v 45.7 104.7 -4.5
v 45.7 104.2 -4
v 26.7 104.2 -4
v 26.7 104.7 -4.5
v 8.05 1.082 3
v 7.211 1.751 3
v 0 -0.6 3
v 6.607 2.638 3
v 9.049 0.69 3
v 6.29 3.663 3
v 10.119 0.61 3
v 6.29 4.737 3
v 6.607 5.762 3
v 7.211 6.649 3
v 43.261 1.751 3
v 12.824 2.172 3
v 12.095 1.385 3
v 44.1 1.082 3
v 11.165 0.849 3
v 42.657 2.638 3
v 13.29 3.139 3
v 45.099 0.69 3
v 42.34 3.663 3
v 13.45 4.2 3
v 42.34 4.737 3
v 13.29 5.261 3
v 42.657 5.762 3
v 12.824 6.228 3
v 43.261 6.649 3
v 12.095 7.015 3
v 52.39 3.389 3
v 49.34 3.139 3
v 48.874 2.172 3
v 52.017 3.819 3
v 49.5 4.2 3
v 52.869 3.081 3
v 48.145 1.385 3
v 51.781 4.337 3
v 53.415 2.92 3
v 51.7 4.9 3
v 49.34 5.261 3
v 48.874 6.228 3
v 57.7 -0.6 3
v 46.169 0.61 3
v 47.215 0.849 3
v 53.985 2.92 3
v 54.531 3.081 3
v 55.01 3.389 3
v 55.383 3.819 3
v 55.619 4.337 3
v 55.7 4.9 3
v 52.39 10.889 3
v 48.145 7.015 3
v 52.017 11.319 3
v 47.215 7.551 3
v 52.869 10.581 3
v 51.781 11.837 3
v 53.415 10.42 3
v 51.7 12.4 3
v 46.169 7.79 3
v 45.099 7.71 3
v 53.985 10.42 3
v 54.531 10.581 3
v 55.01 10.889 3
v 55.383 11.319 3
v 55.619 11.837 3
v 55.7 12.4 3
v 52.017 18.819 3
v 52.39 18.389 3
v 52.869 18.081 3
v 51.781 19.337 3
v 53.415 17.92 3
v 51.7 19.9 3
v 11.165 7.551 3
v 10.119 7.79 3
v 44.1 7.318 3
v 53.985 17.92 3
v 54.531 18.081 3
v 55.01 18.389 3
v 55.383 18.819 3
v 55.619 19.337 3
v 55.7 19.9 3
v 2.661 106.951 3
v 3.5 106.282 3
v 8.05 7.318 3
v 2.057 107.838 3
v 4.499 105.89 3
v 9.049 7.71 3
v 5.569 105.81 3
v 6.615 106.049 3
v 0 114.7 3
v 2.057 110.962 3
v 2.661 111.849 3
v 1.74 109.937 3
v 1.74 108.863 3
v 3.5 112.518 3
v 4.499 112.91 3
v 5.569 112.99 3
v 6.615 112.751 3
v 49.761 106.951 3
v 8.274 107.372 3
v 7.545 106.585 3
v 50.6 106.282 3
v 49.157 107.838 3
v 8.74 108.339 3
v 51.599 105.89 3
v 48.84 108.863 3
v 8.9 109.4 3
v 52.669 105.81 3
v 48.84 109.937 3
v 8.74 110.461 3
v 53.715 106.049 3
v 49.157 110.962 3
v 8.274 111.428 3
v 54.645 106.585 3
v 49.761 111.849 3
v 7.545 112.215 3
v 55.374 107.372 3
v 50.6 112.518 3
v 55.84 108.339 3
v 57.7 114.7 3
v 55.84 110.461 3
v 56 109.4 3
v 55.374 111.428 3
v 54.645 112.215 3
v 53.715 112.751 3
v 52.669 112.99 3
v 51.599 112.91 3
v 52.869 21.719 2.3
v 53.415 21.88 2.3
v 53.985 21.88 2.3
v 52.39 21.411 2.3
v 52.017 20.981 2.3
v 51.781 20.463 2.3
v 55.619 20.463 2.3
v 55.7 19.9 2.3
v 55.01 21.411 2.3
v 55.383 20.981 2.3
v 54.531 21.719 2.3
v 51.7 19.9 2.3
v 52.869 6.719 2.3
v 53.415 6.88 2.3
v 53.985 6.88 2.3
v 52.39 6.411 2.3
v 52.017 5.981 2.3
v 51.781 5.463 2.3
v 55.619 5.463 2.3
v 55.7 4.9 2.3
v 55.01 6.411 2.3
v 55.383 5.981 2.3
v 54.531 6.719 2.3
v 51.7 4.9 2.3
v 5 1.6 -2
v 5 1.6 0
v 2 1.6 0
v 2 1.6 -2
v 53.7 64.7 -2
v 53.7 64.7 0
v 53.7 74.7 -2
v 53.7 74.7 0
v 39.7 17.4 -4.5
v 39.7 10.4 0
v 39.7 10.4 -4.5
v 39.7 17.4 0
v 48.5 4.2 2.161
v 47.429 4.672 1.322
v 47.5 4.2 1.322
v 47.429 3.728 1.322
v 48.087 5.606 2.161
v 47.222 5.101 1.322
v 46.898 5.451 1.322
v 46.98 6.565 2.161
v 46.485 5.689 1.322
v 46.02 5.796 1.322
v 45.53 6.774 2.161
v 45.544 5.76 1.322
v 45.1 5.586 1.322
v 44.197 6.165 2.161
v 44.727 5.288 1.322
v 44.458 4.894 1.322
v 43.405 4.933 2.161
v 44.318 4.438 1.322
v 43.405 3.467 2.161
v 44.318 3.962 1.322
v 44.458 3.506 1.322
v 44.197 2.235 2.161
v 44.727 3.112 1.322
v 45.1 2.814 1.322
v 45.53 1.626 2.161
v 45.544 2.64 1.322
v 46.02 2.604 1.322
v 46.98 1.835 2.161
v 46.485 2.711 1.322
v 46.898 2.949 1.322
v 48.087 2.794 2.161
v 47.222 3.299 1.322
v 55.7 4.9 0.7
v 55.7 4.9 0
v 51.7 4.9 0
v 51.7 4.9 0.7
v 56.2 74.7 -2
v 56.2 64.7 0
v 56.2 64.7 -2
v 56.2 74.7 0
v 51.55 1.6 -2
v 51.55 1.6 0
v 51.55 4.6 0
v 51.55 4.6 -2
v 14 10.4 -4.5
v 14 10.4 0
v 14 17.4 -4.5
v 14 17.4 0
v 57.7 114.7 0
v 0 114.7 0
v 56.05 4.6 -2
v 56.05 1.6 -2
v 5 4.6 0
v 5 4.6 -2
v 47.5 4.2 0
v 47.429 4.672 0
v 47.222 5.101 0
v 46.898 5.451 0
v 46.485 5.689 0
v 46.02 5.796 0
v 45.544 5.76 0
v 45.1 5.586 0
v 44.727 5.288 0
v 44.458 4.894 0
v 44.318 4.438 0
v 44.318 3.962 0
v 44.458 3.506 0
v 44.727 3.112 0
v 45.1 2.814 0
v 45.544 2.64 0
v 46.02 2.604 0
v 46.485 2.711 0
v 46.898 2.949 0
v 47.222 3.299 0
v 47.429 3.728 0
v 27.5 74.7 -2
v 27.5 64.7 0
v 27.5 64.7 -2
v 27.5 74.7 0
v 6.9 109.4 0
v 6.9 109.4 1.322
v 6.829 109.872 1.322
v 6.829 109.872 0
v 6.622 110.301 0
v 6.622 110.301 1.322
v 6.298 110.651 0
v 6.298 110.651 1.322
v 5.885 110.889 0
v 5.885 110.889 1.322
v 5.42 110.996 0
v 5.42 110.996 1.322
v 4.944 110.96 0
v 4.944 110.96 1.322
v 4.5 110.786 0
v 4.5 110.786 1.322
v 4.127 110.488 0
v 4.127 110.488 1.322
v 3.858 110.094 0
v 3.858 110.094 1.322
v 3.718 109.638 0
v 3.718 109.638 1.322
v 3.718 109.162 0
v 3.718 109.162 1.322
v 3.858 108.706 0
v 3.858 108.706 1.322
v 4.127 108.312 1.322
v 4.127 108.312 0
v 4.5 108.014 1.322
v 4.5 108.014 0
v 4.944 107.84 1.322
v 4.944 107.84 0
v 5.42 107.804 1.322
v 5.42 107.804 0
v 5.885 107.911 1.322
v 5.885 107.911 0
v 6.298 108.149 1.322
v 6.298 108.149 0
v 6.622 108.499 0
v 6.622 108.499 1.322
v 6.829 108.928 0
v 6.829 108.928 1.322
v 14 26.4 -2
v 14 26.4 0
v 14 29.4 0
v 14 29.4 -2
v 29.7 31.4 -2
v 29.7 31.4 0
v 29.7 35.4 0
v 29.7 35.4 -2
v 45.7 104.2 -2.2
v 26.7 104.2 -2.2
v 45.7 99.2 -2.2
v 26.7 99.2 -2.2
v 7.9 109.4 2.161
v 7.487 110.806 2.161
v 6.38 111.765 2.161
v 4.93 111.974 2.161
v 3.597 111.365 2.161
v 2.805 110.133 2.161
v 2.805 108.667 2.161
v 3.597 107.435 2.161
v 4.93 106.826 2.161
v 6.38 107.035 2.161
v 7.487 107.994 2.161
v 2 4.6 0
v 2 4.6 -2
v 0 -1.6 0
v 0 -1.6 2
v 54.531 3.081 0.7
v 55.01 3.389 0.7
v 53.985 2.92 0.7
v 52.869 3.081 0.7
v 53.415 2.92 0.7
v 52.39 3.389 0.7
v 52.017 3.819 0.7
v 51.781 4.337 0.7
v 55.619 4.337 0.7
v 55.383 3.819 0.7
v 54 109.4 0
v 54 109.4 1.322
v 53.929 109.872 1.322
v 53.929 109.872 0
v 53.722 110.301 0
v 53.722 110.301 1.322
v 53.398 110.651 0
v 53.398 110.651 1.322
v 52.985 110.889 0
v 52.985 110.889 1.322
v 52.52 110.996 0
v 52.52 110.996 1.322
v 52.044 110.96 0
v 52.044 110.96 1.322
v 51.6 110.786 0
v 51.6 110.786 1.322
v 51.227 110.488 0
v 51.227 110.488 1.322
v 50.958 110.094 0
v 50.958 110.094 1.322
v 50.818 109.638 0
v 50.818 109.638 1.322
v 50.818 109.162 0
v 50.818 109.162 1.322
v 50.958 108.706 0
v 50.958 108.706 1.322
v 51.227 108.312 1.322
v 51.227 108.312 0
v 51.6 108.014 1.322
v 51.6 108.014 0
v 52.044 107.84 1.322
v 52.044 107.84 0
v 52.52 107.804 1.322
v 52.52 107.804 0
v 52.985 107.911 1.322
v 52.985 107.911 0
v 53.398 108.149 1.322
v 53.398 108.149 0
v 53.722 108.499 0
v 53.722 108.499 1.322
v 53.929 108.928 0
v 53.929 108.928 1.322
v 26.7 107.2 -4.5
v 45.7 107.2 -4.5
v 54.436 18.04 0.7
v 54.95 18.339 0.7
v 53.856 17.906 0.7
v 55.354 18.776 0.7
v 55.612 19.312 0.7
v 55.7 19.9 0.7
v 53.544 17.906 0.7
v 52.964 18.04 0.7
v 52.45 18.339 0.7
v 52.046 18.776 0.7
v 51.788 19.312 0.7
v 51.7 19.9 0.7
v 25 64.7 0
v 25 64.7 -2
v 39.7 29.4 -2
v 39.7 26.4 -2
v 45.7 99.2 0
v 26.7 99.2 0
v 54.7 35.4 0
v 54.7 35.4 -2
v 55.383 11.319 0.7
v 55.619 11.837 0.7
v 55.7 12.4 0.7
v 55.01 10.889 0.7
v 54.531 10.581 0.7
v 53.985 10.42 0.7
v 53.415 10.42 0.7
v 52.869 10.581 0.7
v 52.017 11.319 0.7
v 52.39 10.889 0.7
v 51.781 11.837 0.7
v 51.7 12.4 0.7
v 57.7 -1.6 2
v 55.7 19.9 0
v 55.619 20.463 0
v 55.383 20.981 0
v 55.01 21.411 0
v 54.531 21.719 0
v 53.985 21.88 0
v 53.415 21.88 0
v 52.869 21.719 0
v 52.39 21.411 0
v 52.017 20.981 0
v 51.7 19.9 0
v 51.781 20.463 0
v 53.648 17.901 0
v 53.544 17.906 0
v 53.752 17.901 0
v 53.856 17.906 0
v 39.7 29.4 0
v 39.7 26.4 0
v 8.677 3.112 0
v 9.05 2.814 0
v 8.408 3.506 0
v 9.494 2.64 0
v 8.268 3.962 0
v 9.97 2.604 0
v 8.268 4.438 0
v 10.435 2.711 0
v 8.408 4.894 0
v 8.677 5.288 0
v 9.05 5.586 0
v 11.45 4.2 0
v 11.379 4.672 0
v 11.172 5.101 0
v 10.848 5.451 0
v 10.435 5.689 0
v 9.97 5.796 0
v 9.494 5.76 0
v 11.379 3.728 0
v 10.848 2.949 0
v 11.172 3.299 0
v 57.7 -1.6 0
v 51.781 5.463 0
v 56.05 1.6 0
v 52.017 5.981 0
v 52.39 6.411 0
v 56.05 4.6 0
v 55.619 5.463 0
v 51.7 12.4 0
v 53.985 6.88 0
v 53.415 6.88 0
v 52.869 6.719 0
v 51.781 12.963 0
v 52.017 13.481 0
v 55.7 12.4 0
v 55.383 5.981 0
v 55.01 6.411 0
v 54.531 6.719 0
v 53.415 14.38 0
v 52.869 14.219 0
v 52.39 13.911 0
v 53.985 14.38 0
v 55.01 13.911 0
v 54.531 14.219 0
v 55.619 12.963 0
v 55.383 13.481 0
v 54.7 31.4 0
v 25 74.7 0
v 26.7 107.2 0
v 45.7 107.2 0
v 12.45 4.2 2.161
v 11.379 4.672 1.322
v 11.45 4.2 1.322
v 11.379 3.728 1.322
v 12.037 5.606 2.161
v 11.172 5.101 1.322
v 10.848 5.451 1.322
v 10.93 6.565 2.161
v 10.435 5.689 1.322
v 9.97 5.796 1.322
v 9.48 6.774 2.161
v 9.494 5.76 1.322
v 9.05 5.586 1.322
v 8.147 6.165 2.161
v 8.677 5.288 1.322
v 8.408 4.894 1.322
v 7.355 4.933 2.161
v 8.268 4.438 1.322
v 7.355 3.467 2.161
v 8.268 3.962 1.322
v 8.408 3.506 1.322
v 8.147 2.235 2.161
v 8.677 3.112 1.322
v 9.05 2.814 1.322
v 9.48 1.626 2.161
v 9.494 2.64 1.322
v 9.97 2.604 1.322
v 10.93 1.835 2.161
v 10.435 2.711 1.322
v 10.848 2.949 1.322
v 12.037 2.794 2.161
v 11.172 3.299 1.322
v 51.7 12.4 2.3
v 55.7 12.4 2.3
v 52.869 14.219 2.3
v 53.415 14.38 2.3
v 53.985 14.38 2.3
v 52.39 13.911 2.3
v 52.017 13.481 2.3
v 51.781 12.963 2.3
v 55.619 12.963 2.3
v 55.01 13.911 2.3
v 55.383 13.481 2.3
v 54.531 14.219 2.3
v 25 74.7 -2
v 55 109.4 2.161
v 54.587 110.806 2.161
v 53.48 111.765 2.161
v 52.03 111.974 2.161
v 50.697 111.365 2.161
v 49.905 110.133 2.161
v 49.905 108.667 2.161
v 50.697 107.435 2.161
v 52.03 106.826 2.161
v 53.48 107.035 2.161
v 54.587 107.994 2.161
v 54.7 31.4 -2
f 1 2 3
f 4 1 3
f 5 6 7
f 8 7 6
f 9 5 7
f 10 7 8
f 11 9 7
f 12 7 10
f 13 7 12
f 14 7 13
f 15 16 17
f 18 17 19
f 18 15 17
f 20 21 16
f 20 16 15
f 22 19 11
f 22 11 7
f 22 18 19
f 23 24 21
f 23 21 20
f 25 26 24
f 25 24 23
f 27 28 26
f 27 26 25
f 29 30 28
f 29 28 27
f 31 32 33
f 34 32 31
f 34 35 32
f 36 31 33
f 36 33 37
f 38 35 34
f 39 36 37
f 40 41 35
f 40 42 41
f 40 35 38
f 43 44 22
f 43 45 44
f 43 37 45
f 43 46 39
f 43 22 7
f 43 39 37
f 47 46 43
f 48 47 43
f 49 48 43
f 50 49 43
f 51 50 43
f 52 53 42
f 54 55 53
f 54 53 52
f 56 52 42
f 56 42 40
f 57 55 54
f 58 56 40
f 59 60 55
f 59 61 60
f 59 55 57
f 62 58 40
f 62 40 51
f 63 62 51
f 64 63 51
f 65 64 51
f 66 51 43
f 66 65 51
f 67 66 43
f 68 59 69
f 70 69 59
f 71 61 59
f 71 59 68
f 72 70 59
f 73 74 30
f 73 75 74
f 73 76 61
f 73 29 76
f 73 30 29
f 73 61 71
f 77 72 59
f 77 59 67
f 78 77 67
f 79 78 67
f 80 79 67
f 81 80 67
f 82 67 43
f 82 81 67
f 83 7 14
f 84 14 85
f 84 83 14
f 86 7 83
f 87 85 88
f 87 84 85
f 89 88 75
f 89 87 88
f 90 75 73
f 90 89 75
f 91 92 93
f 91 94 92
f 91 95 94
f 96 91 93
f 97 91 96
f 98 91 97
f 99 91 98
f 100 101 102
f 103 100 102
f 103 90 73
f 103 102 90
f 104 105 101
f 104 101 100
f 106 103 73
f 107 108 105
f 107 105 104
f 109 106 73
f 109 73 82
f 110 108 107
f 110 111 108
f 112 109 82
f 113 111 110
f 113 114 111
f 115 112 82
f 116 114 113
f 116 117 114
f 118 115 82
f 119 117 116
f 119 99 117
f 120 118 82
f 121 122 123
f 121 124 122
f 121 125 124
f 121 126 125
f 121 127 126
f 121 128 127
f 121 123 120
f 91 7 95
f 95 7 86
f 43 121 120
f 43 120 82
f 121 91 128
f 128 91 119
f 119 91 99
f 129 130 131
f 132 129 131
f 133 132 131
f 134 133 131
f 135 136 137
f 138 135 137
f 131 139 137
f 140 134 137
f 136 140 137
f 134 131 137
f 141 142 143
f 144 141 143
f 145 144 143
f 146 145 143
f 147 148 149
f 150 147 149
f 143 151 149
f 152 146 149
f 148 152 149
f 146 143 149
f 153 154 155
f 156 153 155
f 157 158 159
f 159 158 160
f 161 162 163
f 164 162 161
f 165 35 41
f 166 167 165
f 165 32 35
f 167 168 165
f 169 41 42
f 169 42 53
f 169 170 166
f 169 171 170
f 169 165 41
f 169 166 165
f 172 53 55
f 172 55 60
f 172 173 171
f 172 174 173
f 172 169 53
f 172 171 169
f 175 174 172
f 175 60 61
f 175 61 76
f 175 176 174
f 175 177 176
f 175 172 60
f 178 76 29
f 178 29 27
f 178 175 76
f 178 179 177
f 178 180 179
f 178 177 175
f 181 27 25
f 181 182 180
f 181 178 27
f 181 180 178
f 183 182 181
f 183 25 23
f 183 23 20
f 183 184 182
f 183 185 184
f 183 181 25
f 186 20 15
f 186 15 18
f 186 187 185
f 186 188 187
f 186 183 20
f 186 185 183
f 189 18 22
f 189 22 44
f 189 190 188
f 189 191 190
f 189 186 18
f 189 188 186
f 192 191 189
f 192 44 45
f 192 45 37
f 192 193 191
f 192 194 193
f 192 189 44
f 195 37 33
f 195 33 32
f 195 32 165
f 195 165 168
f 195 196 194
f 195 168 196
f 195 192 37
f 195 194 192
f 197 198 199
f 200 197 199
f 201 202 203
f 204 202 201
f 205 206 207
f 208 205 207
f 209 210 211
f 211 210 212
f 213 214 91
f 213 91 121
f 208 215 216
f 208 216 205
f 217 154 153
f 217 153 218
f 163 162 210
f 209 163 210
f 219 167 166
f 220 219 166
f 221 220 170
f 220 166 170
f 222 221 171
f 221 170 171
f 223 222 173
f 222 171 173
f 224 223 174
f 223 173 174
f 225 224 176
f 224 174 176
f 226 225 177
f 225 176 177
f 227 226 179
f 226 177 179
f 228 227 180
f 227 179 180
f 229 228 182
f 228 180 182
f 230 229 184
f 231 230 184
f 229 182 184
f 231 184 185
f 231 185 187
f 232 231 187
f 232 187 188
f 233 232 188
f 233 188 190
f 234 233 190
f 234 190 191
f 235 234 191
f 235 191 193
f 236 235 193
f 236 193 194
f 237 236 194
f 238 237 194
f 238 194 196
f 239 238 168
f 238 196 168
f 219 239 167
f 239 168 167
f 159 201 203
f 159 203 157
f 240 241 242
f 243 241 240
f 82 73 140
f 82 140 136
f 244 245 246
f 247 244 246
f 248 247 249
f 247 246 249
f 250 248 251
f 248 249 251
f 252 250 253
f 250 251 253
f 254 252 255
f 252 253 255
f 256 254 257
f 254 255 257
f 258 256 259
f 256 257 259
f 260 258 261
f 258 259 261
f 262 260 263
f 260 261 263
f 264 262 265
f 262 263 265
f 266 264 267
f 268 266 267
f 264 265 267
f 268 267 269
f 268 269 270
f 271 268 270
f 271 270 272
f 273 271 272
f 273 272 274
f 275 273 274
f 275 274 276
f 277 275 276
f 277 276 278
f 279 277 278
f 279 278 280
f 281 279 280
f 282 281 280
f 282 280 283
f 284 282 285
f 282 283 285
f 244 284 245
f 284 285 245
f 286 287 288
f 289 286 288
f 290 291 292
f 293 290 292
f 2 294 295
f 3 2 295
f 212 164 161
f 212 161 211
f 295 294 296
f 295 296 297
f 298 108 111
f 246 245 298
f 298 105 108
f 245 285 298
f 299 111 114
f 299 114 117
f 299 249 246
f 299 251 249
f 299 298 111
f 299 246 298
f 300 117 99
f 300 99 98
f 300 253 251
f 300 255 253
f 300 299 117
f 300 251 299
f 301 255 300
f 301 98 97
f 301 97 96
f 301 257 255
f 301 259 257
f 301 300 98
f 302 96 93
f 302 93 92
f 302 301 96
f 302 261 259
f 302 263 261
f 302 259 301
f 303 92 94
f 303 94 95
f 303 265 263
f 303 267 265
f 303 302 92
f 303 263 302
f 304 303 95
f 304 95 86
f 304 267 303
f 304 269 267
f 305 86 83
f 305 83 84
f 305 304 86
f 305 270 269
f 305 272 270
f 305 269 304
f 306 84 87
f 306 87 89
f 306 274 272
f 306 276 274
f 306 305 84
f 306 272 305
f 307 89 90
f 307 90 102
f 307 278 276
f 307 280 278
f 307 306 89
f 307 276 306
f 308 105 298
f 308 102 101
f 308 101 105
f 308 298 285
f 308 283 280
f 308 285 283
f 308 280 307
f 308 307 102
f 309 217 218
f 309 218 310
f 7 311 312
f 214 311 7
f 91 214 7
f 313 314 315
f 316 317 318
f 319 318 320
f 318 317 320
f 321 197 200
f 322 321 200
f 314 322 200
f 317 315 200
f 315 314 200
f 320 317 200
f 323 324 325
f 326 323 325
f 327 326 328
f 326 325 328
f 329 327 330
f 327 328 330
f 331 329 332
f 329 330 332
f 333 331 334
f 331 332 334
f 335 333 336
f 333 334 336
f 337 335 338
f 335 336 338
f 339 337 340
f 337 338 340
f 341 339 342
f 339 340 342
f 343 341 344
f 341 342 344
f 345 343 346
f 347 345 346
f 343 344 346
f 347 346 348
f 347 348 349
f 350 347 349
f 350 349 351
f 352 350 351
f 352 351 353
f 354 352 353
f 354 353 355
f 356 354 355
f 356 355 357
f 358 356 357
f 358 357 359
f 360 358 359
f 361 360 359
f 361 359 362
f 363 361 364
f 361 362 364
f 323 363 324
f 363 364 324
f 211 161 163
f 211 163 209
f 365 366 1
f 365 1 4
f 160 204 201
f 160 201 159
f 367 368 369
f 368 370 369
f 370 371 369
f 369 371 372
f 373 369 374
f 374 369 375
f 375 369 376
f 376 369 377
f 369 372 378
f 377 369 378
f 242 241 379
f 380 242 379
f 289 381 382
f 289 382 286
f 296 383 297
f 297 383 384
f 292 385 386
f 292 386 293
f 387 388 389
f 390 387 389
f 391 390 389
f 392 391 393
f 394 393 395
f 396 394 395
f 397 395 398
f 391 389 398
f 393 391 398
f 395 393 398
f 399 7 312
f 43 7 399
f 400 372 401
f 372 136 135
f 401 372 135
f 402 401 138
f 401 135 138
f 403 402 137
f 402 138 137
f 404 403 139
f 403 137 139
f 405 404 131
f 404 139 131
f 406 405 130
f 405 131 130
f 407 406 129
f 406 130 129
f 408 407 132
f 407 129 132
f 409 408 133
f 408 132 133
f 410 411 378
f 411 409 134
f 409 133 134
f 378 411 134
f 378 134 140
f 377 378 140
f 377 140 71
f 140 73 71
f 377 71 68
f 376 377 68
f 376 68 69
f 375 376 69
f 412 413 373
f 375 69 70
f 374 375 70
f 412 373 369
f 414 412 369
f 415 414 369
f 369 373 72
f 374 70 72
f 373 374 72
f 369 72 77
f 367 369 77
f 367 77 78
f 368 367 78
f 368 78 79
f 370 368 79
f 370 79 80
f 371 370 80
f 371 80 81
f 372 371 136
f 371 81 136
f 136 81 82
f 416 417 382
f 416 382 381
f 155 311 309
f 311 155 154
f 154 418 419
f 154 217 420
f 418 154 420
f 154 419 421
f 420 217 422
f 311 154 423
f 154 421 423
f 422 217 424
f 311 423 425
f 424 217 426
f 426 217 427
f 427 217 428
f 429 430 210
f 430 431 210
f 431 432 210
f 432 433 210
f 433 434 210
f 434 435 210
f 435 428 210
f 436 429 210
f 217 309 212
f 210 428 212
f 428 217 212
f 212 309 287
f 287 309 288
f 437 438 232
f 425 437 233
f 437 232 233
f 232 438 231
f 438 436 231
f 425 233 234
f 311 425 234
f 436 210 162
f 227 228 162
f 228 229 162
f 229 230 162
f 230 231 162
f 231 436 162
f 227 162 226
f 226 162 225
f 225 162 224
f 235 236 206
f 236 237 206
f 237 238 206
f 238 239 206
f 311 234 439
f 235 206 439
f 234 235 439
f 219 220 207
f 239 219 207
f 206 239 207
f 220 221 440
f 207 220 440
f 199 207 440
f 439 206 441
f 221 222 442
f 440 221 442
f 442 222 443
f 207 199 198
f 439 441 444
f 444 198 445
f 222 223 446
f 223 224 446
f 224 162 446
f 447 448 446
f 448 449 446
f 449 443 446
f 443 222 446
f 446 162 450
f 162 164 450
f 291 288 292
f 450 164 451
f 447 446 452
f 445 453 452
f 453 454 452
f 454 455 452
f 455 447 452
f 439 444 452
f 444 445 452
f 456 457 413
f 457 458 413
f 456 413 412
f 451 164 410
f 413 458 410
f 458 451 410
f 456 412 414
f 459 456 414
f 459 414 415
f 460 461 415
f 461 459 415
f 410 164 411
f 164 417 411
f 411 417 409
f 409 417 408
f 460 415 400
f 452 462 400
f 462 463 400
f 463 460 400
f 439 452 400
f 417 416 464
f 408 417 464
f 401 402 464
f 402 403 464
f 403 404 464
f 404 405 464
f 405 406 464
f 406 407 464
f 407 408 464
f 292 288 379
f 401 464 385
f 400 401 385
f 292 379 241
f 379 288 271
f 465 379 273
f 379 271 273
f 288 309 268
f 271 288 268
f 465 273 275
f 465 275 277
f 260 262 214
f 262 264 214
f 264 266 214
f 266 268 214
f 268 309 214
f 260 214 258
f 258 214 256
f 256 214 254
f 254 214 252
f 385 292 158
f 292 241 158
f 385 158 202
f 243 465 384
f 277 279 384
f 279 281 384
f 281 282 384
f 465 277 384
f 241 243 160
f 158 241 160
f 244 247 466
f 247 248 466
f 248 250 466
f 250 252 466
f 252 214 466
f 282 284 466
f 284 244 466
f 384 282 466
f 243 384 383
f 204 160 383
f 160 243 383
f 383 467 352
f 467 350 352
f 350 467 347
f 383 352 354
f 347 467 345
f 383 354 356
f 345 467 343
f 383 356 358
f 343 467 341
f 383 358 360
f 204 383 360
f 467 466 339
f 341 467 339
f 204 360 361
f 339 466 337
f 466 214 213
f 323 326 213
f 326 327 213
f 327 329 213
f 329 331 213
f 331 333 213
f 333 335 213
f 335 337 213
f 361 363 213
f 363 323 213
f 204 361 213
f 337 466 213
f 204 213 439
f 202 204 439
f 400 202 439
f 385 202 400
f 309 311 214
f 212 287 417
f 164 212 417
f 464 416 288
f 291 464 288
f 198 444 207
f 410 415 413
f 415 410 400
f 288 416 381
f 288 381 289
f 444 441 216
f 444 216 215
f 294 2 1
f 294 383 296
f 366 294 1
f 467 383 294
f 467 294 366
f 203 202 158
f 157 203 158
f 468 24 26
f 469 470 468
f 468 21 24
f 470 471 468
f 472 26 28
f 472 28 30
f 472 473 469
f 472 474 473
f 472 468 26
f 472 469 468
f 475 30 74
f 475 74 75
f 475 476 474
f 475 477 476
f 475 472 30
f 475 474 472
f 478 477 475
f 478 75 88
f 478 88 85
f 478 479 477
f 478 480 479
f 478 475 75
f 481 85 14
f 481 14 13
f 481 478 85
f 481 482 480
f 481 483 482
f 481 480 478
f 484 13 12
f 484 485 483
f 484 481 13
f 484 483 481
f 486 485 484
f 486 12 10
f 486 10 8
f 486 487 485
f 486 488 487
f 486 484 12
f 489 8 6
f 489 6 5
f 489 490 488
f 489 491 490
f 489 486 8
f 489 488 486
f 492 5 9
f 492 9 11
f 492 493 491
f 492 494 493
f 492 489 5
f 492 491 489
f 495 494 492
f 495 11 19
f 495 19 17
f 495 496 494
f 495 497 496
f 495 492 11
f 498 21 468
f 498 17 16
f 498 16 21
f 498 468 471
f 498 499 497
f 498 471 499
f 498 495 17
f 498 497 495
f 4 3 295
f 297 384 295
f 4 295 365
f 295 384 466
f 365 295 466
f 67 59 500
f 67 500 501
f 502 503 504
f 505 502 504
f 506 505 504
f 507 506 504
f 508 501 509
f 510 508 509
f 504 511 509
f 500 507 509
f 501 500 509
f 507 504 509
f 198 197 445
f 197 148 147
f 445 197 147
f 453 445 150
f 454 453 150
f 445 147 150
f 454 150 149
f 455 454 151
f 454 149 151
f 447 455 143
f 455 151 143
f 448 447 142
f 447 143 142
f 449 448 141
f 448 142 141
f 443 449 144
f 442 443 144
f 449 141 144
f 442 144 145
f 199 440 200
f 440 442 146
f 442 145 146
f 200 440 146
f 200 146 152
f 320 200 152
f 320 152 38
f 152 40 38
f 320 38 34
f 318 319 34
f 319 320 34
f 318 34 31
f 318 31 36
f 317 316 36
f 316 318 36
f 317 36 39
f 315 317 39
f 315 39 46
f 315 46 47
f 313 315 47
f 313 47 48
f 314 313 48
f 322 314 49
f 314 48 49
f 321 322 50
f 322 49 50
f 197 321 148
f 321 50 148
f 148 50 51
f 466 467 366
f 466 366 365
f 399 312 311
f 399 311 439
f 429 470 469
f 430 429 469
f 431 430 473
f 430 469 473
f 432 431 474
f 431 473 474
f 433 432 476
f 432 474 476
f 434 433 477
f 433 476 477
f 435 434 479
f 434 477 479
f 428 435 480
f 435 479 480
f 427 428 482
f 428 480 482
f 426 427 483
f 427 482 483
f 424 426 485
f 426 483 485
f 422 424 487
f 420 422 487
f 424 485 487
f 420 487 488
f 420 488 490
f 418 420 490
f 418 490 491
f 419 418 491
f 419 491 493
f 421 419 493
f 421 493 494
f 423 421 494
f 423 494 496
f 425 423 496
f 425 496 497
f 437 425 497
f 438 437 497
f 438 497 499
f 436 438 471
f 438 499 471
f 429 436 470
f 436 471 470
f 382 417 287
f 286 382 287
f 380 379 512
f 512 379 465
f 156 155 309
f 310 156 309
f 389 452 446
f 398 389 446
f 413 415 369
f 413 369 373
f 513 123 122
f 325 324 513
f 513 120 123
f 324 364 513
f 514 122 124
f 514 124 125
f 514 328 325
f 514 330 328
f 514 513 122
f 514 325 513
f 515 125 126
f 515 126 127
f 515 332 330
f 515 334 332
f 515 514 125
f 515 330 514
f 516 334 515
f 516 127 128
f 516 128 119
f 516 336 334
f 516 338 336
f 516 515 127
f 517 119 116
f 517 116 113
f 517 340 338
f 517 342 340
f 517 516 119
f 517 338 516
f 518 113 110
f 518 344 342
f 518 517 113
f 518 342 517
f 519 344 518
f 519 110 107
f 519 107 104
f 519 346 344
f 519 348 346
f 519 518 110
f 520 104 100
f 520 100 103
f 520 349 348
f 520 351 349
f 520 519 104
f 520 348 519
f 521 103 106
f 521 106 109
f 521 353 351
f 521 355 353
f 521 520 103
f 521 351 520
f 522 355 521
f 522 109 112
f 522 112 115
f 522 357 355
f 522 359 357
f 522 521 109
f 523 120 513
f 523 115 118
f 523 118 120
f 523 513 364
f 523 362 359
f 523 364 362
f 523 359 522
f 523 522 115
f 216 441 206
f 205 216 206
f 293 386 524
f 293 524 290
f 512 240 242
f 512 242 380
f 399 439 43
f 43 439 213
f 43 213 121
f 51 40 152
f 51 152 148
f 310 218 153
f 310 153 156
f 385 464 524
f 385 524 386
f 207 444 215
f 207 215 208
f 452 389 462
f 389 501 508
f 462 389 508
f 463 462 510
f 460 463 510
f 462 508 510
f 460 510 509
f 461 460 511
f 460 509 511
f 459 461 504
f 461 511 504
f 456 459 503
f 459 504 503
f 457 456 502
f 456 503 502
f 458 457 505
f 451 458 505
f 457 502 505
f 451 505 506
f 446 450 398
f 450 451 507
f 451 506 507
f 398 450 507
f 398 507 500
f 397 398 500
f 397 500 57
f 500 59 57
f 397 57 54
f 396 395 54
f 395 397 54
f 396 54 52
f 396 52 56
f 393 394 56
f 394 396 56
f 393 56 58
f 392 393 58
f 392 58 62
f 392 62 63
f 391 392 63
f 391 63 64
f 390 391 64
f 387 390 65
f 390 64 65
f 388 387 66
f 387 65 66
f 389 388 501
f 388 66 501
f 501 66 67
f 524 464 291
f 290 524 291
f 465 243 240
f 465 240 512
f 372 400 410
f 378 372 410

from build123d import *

# Parameters (mm, degrees)
SKETCH1_W            = 57.7
SKETCH1_H            = 114.7
BOSS_EXTRUDE1_DEPTH  = 3
SKETCH2_R            = 1.6
CUT_EXTRUDE1_DEPTH   = 3
CHAMFER1_SIZE        = 2
CHAMFER1_SIZE2       = 1.678199262
SKETCH4_W            = 57.7
SKETCH4_H            = 3
BOSS_EXTRUDE2_DEPTH  = 1.6
SKETCH5_W            = 19
SKETCH5_H            = 6
BOSS_EXTRUDE3_DEPTH  = 2.2
SKETCH7_W            = 19
SKETCH7_H            = 3
BOSS_EXTRUDE4_DEPTH  = 4.5
CHAMFER2_SIZE        = 0.5
SKETCH8_W            = 25.7
SKETCH8_H            = 3
SKETCH8_W_2          = 25
SKETCH8_H_2          = 4
BOSS_EXTRUDE5_DEPTH  = 2
SKETCH9_W            = 25.7
SKETCH9_H            = 7
BOSS_EXTRUDE6_DEPTH  = 4.5
SKETCH10_R           = 2
CUT_EXTRUDE2_DEPTH   = 3
SKETCH11_W           = 4
SKETCH11_H           = 2
BOSS_EXTRUDE7_DEPTH  = 0.7
SKETCH12_W           = 4
SKETCH12_H           = 1.993871031
SKETCH12_H_2         = 2
BOSS_EXTRUDE11_DEPTH = 0.7
SKETCH13_W           = 4.5
SKETCH13_H           = 3
SKETCH13_W_2         = 3
BOSS_EXTRUDE12_DEPTH = 2
SKETCH14_W           = 2.5
SKETCH14_H           = 10
BOSS_EXTRUDE13_DEPTH = 2
CHAMFER3_SIZE        = 1


with BuildPart() as part:
    # Sketch1 → Boss-Extrude1 (new body)
    with BuildSketch(Plane.XY):
        with Locations((28.85, 57.35)):
            Rectangle(SKETCH1_W, SKETCH1_H)
    extrude(amount=BOSS_EXTRUDE1_DEPTH)

    # Sketch2 → Cut-Extrude1 (cut)
    with BuildSketch(Plane.XY.offset(3)):
        with Locations((5.3, 109.4)):
            Circle(SKETCH2_R)
        with Locations((52.4, 109.4)):
            Circle(SKETCH2_R)
        with Locations((9.85, 4.2)):
            Circle(SKETCH2_R)
        with Locations((45.9, 4.2)):
            Circle(SKETCH2_R)
    extrude(amount=-CUT_EXTRUDE1_DEPTH, mode=Mode.SUBTRACT)

    # Chamfer1
    chamfer1_edges = [part.edges().sort_by_distance(p)[0] for p in [
        (3.7, 109.4, 3),
        (44.3, 4.2, 3),
        (8.25, 4.2, 3),
        (50.8, 109.4, 3),
    ]]
    chamfer1_side = [part.faces().sort_by_distance(p)[0] for p in [
        (28.85238123, 57.352686516, 3),
    ]]
    chamfer(chamfer1_edges, length=CHAMFER1_SIZE, length2=CHAMFER1_SIZE2, reference=chamfer1_side[0])

    # Sketch4 → Boss-Extrude2 (add)
    with BuildSketch(Plane.XZ):
        with Locations((28.85, 1.5)):
            Rectangle(SKETCH4_W, SKETCH4_H)
    extrude(amount=BOSS_EXTRUDE2_DEPTH)

    # Sketch5 → Boss-Extrude3 (add)
    with BuildSketch(Plane(origin=(0, 0, 0), x_dir=(-1, 0, 0), z_dir=(0, 0, -1))):
        with Locations((-36.2, 102.2)):
            Rectangle(SKETCH5_W, SKETCH5_H)
    extrude(amount=BOSS_EXTRUDE3_DEPTH)

    # Sketch7 → Boss-Extrude4 (add)
    with BuildSketch(Plane(origin=(0, 0, 0), x_dir=(-1, 0, 0), z_dir=(0, 0, -1))):
        with Locations((-36.2, 105.7)):
            Rectangle(SKETCH7_W, SKETCH7_H)
    extrude(amount=BOSS_EXTRUDE4_DEPTH)

    # Chamfer2
    chamfer2_edges = [part.edges().sort_by_distance(p)[0] for p in [
        (36.2, 104.2, -4.5),
    ]]
    chamfer(chamfer2_edges, length=CHAMFER2_SIZE)

    # Sketch8 → Boss-Extrude5 (add)
    with BuildSketch(Plane(origin=(0, 0, 0), x_dir=(-1, 0, 0), z_dir=(0, 0, -1))):
        with Locations((-26.85, 27.9)):
            Rectangle(SKETCH8_W, SKETCH8_H)
        with Locations((-42.2, 33.4)):
            Rectangle(SKETCH8_W_2, SKETCH8_H_2)
    extrude(amount=BOSS_EXTRUDE5_DEPTH)

    # Sketch9 → Boss-Extrude6 (add)
    with BuildSketch(Plane(origin=(0, 0, 0), x_dir=(-1, 0, 0), z_dir=(0, 0, -1))):
        with Locations((-26.85, 13.9)):
            Rectangle(SKETCH9_W, SKETCH9_H)
    extrude(amount=BOSS_EXTRUDE6_DEPTH)

    # Sketch10 → Cut-Extrude2 (cut)
    with BuildSketch(Plane.XY.offset(3)):
        with Locations((53.7, 19.9)):
            Circle(SKETCH10_R)
        with Locations((53.7, 12.4)):
            Circle(SKETCH10_R)
        with Locations((53.7, 4.9)):
            Circle(SKETCH10_R)
    extrude(amount=-CUT_EXTRUDE2_DEPTH, mode=Mode.SUBTRACT)

    # Sketch11 → Boss-Extrude7 (add)
    with BuildSketch(Plane.XY.offset(3)):
        with Locations((53.7, 20.9)):
            Rectangle(SKETCH11_W, SKETCH11_H)
        with Locations((53.7, 13.4)):
            Rectangle(SKETCH11_W, SKETCH11_H)
        with Locations((53.7, 5.9)):
            Rectangle(SKETCH11_W, SKETCH11_H)
    extrude(amount=-BOSS_EXTRUDE7_DEPTH)

    # Sketch12 → Boss-Extrude11 (add)
    with BuildSketch(Plane(origin=(0, 0, 0), x_dir=(-1, 0, 0), z_dir=(0, 0, -1))):
        with Locations((-53.7, 18.903064484)):
            Rectangle(SKETCH12_W, SKETCH12_H)
        with Locations((-53.7, 11.4)):
            Rectangle(SKETCH12_W, SKETCH12_H_2)
        with Locations((-53.7, 3.9)):
            Rectangle(SKETCH12_W, SKETCH12_H_2)
    extrude(amount=-BOSS_EXTRUDE11_DEPTH)

    # Sketch13 → Boss-Extrude12 (add)
    with BuildSketch(Plane(origin=(0, 0, 0), x_dir=(-1, 0, 0), z_dir=(0, 0, -1))):
        with Locations((-53.8, 3.1)):
            Rectangle(SKETCH13_W, SKETCH13_H)
        with Locations((-3.5, 3.1)):
            Rectangle(SKETCH13_W_2, SKETCH13_H)
    extrude(amount=BOSS_EXTRUDE12_DEPTH)

    # Sketch14 → Boss-Extrude13 (add)
    with BuildSketch(Plane(origin=(0, 0, 0), x_dir=(-1, 0, 0), z_dir=(0, 0, -1))):
        with Locations((-54.95, 69.7)):
            Rectangle(SKETCH14_W, SKETCH14_H)
        with Locations((-26.25, 69.7)):
            Rectangle(SKETCH14_W, SKETCH14_H)
    extrude(amount=BOSS_EXTRUDE13_DEPTH)

    # Chamfer3
    chamfer3_edges = [part.edges().sort_by_distance(p)[0] for p in [
        (28.85, -1.6, 3),
    ]]
    chamfer(chamfer3_edges, length=CHAMFER3_SIZE)


solid = part.part
